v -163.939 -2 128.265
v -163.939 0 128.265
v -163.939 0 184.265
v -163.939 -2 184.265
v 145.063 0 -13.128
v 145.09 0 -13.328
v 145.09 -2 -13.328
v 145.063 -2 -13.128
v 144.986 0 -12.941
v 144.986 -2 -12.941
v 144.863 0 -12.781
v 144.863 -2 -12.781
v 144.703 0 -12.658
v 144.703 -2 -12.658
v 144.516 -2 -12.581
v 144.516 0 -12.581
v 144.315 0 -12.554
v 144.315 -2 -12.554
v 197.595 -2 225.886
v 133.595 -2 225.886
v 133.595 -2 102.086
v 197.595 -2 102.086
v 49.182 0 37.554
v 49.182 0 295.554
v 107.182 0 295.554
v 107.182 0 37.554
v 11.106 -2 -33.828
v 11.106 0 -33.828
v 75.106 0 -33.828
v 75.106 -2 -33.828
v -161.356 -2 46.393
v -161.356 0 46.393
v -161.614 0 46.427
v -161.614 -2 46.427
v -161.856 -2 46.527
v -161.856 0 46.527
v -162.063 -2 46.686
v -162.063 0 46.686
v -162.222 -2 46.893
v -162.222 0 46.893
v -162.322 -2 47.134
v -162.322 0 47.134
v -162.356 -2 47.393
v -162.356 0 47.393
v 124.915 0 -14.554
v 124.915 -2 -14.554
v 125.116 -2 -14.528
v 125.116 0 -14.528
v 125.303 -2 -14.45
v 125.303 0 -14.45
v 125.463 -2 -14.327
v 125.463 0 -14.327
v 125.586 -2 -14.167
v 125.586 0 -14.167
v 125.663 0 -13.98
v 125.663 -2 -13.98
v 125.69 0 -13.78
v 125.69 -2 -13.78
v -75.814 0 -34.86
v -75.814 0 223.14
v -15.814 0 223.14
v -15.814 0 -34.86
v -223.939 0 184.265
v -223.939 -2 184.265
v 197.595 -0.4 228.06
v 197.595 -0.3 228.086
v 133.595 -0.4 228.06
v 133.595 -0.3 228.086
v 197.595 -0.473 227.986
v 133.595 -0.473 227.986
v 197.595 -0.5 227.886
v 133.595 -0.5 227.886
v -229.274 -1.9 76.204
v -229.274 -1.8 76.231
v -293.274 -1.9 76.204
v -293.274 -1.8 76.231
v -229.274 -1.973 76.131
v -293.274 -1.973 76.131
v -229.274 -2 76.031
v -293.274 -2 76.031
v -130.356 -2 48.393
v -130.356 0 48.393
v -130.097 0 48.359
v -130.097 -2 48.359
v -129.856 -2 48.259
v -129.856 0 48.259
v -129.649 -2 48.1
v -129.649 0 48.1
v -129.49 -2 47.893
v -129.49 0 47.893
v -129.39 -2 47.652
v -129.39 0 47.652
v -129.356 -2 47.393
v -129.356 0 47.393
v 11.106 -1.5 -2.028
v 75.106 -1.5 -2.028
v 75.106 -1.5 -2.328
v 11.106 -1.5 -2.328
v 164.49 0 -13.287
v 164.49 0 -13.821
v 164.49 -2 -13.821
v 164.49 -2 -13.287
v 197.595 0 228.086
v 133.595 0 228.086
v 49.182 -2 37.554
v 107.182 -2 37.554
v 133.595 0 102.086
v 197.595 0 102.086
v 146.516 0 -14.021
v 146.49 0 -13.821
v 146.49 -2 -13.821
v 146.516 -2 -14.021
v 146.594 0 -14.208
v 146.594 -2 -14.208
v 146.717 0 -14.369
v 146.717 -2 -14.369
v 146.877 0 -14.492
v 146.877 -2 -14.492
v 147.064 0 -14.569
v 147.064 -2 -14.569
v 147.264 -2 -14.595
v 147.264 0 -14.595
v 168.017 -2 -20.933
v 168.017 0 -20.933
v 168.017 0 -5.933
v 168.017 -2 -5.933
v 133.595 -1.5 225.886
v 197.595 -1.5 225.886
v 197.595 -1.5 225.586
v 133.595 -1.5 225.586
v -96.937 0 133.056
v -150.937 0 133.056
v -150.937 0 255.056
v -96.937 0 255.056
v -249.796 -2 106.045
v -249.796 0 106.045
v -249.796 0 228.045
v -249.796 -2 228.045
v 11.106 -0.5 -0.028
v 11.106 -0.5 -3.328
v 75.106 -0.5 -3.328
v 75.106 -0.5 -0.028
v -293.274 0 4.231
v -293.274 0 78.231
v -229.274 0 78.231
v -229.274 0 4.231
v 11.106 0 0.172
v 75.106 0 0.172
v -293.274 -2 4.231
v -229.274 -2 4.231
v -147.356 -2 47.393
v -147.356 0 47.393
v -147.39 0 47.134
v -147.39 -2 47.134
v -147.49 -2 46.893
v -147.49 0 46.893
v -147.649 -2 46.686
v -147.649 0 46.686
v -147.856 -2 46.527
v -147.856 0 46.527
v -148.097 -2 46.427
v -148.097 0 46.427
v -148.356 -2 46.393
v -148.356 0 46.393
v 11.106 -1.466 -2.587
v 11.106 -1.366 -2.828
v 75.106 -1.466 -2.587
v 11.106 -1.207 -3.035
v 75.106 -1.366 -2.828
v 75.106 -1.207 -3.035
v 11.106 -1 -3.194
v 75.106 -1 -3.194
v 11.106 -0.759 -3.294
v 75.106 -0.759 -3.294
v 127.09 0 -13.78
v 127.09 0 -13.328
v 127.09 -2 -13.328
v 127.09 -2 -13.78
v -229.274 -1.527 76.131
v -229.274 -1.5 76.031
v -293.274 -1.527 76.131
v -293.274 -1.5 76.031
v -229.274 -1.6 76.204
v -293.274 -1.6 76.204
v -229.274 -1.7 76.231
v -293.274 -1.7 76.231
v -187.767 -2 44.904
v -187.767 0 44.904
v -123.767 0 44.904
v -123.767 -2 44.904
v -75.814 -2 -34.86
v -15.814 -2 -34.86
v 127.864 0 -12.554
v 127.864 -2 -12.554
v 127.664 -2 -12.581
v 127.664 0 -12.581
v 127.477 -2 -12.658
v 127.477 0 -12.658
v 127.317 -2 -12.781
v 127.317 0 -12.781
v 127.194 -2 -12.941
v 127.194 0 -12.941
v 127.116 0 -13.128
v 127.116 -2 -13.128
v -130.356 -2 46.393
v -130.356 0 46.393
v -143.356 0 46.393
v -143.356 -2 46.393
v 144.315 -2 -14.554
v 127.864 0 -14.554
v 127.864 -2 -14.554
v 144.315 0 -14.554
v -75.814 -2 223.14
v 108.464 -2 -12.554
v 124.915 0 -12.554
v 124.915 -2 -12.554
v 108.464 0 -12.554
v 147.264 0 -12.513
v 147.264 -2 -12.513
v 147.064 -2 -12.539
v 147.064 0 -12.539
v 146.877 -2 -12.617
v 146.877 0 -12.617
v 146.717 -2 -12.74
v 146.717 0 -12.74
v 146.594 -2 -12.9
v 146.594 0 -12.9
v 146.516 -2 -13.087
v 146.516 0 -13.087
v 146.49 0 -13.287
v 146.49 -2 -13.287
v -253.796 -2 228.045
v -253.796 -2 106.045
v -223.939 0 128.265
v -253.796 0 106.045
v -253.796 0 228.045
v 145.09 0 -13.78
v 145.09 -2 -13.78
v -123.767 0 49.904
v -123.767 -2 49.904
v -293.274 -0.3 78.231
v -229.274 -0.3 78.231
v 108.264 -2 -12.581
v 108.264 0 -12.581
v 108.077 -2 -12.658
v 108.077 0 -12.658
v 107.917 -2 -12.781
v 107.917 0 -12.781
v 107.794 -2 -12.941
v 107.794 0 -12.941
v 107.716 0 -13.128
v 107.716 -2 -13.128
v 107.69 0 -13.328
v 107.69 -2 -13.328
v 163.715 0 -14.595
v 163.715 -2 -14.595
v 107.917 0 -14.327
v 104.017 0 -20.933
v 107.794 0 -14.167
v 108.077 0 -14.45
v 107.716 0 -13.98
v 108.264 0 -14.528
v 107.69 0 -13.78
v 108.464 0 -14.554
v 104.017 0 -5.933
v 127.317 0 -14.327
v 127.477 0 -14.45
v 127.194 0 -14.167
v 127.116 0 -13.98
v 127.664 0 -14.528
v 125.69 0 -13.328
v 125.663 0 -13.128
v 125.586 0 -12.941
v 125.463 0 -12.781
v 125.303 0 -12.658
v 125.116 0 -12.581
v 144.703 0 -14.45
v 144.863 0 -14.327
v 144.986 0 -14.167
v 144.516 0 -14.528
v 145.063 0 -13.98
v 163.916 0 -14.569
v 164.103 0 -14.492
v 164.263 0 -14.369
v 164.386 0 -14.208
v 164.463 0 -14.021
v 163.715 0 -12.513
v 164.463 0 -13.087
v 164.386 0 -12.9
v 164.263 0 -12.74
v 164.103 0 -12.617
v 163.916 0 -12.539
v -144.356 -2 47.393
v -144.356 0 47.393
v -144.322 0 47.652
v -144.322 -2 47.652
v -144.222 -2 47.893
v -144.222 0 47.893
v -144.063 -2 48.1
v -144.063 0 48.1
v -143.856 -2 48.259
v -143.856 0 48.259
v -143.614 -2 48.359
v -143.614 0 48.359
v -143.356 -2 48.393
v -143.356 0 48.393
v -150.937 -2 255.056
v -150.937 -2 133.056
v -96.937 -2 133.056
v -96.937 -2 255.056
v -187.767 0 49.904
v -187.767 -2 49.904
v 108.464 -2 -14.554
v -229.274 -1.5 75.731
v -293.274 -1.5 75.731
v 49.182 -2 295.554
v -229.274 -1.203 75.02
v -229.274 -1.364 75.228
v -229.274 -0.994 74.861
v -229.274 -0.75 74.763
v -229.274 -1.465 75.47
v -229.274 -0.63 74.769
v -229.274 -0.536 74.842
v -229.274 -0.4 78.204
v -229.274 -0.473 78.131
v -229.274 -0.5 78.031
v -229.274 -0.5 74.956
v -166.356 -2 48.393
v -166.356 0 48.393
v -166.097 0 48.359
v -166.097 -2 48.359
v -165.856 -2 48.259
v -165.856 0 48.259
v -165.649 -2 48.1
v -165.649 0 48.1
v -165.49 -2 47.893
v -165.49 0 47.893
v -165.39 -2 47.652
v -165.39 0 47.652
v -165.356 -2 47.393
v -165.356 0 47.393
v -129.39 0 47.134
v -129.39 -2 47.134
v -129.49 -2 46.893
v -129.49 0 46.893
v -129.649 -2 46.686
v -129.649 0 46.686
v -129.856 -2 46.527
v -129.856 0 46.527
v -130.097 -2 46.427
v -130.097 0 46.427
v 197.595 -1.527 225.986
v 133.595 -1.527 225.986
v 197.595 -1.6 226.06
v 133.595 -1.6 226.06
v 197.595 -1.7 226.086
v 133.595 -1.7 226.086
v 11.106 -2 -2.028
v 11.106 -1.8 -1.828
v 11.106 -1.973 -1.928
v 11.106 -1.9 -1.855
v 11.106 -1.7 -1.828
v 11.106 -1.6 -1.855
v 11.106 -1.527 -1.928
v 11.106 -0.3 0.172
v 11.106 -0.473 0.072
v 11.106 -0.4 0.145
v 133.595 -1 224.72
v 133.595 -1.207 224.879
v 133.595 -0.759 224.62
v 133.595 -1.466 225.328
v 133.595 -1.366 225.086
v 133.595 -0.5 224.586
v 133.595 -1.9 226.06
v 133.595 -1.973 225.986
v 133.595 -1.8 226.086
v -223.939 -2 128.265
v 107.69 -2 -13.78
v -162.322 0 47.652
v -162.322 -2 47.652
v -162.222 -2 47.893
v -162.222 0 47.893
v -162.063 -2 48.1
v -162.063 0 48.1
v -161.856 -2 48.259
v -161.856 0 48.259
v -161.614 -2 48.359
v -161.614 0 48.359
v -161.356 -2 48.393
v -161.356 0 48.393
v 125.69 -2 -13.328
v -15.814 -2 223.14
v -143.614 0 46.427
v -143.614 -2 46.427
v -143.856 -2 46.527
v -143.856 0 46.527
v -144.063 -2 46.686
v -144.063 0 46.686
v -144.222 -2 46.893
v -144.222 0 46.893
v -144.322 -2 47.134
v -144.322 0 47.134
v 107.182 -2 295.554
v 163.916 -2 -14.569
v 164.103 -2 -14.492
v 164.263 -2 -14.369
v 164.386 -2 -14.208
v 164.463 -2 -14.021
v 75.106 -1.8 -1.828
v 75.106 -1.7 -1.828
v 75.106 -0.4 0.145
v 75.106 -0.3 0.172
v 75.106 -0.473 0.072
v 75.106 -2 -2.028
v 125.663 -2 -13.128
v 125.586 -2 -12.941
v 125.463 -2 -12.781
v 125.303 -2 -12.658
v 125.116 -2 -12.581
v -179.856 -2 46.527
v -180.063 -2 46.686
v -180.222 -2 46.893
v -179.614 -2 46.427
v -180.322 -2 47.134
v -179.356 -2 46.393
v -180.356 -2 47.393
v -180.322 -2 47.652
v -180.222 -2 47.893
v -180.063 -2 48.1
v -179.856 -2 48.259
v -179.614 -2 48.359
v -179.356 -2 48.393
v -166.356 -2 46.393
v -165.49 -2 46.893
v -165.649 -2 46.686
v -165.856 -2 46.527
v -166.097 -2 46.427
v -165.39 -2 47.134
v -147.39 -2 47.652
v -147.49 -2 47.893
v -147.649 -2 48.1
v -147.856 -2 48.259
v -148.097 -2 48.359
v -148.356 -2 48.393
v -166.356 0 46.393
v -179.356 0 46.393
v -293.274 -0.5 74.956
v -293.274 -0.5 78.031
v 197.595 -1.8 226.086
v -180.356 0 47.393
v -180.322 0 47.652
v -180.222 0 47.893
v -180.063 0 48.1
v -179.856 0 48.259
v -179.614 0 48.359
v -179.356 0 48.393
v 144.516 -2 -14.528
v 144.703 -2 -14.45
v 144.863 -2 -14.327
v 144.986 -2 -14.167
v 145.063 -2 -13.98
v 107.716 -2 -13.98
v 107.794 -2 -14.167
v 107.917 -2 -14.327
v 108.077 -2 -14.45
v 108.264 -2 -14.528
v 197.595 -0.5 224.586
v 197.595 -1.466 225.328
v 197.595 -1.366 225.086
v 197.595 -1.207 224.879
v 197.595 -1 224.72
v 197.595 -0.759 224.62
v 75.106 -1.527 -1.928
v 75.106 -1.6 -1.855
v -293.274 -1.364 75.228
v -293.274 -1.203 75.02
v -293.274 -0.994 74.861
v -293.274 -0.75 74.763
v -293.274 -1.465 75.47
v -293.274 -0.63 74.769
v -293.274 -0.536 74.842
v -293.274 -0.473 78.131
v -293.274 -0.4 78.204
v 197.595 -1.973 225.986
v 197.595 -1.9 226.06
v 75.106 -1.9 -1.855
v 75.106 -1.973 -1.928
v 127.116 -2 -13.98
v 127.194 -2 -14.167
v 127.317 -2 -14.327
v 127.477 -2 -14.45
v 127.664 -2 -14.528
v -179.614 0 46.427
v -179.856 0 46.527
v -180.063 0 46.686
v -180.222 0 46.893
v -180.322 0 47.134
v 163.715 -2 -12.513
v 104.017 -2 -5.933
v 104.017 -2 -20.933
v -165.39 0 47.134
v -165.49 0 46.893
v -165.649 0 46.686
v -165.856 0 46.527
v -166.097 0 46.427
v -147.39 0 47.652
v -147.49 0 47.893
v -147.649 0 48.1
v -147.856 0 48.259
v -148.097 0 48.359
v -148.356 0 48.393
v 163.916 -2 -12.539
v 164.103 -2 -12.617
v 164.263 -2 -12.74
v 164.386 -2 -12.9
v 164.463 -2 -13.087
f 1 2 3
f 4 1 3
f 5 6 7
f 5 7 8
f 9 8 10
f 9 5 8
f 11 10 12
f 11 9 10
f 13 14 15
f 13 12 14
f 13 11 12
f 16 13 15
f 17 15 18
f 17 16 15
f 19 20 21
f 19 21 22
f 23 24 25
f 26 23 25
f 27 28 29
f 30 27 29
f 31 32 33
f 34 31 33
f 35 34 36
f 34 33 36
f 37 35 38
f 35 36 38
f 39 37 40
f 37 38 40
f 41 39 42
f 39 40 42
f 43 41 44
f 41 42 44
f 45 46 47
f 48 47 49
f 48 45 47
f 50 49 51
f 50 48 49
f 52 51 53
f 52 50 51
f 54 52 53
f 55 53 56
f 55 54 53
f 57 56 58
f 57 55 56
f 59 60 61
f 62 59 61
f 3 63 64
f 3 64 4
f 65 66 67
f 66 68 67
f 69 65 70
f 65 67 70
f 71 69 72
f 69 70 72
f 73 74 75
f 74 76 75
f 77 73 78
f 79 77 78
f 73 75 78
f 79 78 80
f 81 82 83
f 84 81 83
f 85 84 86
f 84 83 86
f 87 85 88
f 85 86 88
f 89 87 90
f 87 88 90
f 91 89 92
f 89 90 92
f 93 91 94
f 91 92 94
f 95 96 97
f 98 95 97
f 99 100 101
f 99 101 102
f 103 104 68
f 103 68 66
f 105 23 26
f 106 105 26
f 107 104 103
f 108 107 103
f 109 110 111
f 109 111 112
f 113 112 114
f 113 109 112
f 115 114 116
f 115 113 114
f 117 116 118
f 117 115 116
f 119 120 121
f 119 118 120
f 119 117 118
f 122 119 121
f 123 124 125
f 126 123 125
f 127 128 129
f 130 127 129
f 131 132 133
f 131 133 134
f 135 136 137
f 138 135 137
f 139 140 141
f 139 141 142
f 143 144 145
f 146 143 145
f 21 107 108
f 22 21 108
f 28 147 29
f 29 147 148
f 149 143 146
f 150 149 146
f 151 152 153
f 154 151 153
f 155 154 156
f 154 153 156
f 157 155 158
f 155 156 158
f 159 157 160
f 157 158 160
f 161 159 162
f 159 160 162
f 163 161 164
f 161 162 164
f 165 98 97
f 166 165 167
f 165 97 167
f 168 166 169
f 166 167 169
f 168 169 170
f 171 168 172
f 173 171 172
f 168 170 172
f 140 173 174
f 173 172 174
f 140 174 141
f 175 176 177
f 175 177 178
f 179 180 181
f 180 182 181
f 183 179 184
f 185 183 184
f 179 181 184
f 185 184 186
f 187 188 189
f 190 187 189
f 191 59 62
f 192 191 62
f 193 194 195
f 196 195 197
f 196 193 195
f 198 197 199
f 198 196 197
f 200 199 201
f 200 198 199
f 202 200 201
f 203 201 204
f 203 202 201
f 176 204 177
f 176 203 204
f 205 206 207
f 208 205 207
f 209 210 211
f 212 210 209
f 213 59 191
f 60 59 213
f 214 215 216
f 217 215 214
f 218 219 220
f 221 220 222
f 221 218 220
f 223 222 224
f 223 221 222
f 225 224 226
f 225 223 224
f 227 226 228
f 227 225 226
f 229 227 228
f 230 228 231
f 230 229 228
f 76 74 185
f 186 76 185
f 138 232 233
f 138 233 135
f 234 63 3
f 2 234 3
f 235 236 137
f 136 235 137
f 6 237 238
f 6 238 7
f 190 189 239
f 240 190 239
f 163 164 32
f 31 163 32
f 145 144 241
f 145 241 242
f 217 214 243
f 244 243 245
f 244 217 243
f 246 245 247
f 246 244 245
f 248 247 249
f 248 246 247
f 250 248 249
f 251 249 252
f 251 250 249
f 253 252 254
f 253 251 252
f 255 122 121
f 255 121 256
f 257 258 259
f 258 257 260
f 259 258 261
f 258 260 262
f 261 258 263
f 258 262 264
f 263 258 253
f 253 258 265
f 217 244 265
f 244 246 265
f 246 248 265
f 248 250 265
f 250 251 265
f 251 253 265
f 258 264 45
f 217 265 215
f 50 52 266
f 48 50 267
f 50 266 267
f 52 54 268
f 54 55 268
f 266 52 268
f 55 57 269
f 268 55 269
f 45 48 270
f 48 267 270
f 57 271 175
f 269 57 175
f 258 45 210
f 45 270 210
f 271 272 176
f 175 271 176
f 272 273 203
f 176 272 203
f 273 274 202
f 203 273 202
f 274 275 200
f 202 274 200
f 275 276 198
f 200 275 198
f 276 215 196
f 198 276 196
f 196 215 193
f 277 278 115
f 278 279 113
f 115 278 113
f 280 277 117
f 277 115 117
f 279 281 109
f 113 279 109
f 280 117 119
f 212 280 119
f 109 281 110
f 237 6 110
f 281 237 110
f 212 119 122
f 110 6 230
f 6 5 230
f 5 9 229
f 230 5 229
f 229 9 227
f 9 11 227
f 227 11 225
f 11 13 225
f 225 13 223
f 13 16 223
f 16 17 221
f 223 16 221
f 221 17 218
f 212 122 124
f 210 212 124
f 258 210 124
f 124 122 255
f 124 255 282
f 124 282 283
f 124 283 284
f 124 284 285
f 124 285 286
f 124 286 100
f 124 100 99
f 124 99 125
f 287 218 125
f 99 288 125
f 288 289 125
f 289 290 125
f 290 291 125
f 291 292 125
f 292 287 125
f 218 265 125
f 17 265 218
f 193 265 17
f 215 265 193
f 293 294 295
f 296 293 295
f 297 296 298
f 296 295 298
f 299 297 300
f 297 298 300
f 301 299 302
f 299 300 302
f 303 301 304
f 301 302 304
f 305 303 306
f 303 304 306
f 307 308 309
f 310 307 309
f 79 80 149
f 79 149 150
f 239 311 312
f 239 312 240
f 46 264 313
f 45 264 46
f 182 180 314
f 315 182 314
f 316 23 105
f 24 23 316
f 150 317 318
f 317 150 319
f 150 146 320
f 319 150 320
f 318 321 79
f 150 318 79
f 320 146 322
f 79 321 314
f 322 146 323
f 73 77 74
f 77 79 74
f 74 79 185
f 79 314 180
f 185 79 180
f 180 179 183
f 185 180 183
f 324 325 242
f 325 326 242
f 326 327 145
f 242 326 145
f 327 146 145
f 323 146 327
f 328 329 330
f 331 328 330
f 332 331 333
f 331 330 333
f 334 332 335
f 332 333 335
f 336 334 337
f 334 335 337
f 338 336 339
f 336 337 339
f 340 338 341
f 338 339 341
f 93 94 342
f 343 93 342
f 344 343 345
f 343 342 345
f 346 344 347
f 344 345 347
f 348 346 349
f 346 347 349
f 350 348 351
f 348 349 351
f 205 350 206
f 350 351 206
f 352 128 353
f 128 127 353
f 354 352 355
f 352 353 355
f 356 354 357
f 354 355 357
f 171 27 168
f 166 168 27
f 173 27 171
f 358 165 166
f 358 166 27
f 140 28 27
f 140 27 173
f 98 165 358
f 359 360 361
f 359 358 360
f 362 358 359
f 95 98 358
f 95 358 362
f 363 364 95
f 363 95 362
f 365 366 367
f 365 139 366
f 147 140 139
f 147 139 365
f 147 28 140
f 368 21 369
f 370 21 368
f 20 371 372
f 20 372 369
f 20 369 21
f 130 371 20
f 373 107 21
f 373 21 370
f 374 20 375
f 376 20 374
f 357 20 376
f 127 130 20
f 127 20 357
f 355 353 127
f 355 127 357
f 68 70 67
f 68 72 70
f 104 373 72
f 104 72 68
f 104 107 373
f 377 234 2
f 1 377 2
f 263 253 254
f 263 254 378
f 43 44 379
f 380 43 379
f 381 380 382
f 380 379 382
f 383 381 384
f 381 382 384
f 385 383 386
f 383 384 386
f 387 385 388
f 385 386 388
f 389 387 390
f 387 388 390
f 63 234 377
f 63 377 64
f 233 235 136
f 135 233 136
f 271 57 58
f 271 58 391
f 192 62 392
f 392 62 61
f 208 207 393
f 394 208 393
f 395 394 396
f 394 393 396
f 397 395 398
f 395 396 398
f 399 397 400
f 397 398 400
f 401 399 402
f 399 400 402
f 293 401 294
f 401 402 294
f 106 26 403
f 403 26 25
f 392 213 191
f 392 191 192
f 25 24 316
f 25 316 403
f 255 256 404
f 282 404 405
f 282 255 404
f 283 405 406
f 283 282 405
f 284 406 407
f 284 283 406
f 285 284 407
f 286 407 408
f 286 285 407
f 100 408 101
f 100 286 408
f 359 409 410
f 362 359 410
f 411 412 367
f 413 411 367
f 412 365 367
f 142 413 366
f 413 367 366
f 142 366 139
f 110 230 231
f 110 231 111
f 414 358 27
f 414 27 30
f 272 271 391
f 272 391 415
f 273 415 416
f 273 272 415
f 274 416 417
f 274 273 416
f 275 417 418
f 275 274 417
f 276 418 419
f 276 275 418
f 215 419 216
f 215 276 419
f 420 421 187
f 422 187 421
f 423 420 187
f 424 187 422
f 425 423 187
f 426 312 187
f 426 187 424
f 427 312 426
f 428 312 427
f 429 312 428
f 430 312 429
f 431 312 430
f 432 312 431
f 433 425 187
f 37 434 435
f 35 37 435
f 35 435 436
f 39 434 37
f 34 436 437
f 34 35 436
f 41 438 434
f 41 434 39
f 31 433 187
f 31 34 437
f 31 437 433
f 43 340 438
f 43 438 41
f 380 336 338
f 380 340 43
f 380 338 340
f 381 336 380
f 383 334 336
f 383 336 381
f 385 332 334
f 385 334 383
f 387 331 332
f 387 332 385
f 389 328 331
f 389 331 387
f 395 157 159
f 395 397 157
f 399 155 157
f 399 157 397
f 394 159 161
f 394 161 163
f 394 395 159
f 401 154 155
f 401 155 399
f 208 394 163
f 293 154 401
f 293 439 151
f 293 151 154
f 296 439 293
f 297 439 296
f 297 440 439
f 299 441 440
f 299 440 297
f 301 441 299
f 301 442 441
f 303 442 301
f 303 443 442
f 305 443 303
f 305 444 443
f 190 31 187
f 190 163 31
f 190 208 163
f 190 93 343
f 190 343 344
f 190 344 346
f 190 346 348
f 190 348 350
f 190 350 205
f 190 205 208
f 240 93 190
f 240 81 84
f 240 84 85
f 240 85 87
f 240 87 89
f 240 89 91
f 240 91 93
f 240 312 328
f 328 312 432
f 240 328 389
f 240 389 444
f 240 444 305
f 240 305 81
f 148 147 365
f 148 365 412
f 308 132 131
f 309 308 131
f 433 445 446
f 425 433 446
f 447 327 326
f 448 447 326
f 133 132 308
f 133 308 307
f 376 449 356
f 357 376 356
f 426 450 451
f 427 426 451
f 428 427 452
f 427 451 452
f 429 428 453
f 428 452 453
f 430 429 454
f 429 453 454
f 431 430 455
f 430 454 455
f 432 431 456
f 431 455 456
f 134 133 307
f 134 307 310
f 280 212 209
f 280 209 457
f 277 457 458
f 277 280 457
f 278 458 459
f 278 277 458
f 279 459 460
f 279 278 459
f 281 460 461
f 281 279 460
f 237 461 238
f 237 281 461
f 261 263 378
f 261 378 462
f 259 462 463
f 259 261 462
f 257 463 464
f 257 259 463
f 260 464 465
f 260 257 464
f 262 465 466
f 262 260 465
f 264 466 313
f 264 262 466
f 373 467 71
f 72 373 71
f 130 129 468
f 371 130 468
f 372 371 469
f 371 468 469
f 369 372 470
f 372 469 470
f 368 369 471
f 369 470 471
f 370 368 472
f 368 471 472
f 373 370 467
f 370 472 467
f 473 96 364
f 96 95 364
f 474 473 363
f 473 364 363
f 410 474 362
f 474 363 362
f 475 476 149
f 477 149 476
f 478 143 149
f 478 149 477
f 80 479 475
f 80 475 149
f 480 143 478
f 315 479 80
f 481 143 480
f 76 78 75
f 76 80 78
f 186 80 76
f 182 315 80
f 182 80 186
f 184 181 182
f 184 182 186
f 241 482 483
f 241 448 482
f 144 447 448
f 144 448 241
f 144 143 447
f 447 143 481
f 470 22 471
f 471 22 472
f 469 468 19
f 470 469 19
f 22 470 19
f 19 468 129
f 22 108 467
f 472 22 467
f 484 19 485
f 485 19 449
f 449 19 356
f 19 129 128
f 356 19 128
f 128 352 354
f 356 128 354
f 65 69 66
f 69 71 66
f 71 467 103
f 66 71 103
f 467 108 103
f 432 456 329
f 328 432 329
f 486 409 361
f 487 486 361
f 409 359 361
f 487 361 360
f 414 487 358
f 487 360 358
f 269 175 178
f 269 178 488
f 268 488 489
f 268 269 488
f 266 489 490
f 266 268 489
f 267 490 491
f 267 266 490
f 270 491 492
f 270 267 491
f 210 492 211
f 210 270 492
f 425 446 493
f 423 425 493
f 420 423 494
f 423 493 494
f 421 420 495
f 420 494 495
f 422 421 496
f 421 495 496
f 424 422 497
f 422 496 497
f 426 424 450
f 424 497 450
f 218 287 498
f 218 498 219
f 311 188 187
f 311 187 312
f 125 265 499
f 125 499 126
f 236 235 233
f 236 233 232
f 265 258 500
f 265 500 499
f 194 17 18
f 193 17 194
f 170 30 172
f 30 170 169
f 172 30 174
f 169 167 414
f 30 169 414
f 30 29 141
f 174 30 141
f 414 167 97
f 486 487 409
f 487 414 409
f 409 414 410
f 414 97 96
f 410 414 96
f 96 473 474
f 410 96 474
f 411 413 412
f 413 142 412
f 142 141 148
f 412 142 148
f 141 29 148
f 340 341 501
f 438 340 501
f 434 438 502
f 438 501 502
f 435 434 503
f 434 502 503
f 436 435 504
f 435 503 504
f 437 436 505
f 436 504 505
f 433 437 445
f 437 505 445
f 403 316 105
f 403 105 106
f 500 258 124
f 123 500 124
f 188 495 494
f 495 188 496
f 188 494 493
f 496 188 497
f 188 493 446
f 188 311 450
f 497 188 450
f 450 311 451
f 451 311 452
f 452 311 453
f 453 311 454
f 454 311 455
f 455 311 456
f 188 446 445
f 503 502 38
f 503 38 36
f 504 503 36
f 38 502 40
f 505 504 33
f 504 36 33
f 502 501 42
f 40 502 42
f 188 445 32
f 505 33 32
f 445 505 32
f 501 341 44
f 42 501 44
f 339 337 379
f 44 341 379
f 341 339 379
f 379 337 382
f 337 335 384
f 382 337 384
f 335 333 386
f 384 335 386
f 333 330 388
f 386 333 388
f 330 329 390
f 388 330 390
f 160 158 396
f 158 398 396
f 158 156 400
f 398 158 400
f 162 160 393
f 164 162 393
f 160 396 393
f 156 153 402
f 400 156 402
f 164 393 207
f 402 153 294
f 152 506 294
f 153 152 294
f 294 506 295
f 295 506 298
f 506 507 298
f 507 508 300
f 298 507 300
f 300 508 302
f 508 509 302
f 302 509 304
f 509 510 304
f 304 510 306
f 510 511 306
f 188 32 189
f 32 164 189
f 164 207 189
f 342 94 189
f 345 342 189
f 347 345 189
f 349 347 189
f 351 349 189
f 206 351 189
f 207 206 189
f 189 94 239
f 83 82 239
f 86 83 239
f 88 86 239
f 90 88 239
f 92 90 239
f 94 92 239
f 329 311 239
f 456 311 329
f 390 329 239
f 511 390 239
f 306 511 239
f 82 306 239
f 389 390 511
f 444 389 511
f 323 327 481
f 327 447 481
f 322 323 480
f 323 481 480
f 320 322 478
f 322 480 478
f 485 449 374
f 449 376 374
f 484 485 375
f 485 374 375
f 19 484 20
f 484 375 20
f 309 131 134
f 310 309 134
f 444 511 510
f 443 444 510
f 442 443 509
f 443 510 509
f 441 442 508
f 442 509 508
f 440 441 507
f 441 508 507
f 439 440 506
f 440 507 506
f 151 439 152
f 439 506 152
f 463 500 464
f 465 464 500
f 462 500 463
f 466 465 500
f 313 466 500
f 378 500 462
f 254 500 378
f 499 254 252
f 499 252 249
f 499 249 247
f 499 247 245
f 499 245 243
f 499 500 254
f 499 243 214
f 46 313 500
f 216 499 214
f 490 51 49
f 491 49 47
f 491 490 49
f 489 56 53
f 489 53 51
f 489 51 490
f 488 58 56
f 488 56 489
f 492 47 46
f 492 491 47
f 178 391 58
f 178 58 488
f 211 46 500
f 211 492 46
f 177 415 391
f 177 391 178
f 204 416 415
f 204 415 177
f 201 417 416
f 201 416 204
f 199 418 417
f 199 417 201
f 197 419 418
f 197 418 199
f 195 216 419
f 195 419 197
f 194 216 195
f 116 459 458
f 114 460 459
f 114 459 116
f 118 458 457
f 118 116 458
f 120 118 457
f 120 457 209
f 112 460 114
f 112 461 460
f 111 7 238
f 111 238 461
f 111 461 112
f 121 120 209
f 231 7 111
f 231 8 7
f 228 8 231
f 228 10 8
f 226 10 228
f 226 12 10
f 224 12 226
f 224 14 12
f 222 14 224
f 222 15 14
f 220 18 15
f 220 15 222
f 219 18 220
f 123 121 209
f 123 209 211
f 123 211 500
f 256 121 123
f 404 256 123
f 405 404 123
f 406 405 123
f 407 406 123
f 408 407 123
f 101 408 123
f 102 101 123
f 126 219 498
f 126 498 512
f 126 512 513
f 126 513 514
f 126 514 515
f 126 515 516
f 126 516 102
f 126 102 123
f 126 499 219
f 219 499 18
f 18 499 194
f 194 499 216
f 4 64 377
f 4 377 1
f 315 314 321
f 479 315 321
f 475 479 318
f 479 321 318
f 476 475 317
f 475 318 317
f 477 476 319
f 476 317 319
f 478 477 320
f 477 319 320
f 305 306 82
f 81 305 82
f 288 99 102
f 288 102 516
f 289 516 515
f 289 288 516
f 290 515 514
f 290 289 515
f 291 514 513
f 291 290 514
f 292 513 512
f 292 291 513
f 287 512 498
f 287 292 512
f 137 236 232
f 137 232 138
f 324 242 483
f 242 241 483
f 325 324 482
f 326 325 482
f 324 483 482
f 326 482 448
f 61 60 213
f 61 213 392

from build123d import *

# Parameters (mm, degrees)
F0_W      = 60
F0_H      = 258
F1_DEPTH  = 2
F2_W      = 58
F2_H      = 258
F3_DEPTH  = 2
F4_W      = 60
F4_H      = 56
F5_DEPTH  = 2
F6_W      = 64
F6_H      = 5
F7_DEPTH  = 2
F8_W      = 64
F8_H      = 74
F9_DEPTH  = 2
F10_W     = 64
F10_H     = 15
F11_DEPTH = 2
F13_DEPTH = 4
F14_W     = 64
F14_H     = 126
F15_DEPTH = 2
F16_W     = 64
F16_H     = 34
F17_DEPTH = 2
F18_W     = 54
F18_H     = 122
F19_DEPTH = 2
F20_W     = 4
F20_H     = 122
F21_DEPTH = 2
F23_DEPTH = 64
F24_R     = 0.2
F26_DEPTH = 64
F27_R     = 0.2
F29_DEPTH = 64
F30_R     = 0.2


with BuildPart() as f1:
    # F0 (on Front) → F1 (new body)
    with BuildSketch(Plane.XZ):
        with Locations((-45.8140162975, 94.1403650641)):
            Rectangle(F0_W, F0_H)
    extrude(amount=F1_DEPTH)


with BuildPart() as f3:
    # F2 (on Front) → F3 (new body)
    with BuildSketch(Plane.XZ):
        with Locations((78.1819216013, 166.5537835062)):
            Rectangle(F2_W, F2_H)
    extrude(amount=F3_DEPTH)


with BuildPart() as f5:
    # F4 (on Front) → F5 (new body)
    with BuildSketch(Plane.XZ):
        with Locations((-193.9391981363, 156.2652424913)):
            Rectangle(F4_W, F4_H)
    extrude(amount=F5_DEPTH)


with BuildPart() as f7:
    # F6 (on Front) → F7 (new body)
    with BuildSketch(Plane.XZ):
        with Locations((-155.7672946453, 47.4037402868)):
            Rectangle(F6_W, F6_H)
        with BuildLine():
            ThreePointArc((-180.3556742668, 47.3932959139), (-180.062781048, 48.1004026951), (-179.3556742668, 48.3932959139))
            Line((-179.3556742668, 48.3932959139), (-166.3556742668, 48.3932959139))
            ThreePointArc((-166.3556742668, 48.3932959139), (-165.6485674856, 48.1004026951), (-165.3556742668, 47.3932959139))
            ThreePointArc((-165.3556742668, 47.3932959139), (-165.6485674856, 46.6861891327), (-166.3556742668, 46.3932959139))
            Line((-166.3556742668, 46.3932959139), (-179.3556742668, 46.3932959139))
            ThreePointArc((-179.3556742668, 46.3932959139), (-180.062781048, 46.6861891327), (-180.3556742668, 47.3932959139))
        make_face(mode=Mode.SUBTRACT)
        with BuildLine():
            ThreePointArc((-162.3556742668, 47.3932959139), (-162.062781048, 48.1004026951), (-161.3556742668, 48.3932959139))
            Line((-161.3556742668, 48.3932959139), (-148.3556742668, 48.3932959139))
            ThreePointArc((-148.3556742668, 48.3932959139), (-147.6485674856, 48.1004026951), (-147.3556742668, 47.3932959139))
            ThreePointArc((-147.3556742668, 47.3932959139), (-147.6485674856, 46.6861891327), (-148.3556742668, 46.3932959139))
            Line((-148.3556742668, 46.3932959139), (-161.3556742668, 46.3932959139))
            ThreePointArc((-161.3556742668, 46.3932959139), (-162.062781048, 46.6861891327), (-162.3556742668, 47.3932959139))
        make_face(mode=Mode.SUBTRACT)
        with BuildLine():
            ThreePointArc((-144.3556742668, 47.3932959139), (-144.062781048, 48.1004026951), (-143.3556742668, 48.3932959139))
            Line((-143.3556742668, 48.3932959139), (-130.3556742668, 48.3932959139))
            ThreePointArc((-130.3556742668, 48.3932959139), (-129.6485674856, 48.1004026951), (-129.3556742668, 47.3932959139))
            ThreePointArc((-129.3556742668, 47.3932959139), (-129.6485674856, 46.6861891327), (-130.3556742668, 46.3932959139))
            Line((-130.3556742668, 46.3932959139), (-143.3556742668, 46.3932959139))
            ThreePointArc((-143.3556742668, 46.3932959139), (-144.062781048, 46.6861891327), (-144.3556742668, 47.3932959139))
        make_face(mode=Mode.SUBTRACT)
    extrude(amount=F7_DEPTH)


with BuildPart() as f9:
    # F8 (on Front) → F9 (new body)
    with BuildSketch(Plane.XZ):
        with Locations((-261.2743257284, 41.2309435084)):
            Rectangle(F8_W, F8_H)
    extrude(amount=F9_DEPTH)

    # F22 (on face) → F23 (cut)
    with BuildSketch(Plane.YZ.offset(-229.2743257284)):
        with BuildLine():
            Line((-0.5, 78.2309435084), (-2, 78.2309435084))
            Line((-2, 78.2309435084), (-2, 76.2309435084))
            Line((-2, 76.2309435084), (-1.5, 76.2309435084))
            Line((-1.5, 76.2309435084), (-1.5, 75.7309435084))
            ThreePointArc((-1.5, 75.7309435084), (-1.2071067812, 75.0238367273), (-0.5, 74.7309435084))
            Line((-0.5, 74.7309435084), (-0.5, 78.2309435084))
        make_face()
    extrude(amount=-F23_DEPTH, mode=Mode.SUBTRACT)

    # F24
    f24_edges = [f9.edges().sort_by_distance(p)[0] for p in [
        (-261.274326, -0.5, 78.230944),
        (-261.274326, -2, 76.230944),
        (-261.274326, -0.5, 74.730944),
        (-261.274326, -1.5, 76.230944),
    ]]
    fillet(f24_edges, radius=F24_R)


with BuildPart() as f11:
    # F10 (on Front) → F11 (new body)
    with BuildSketch(Plane.XZ):
        with Locations((136.0173345804, -13.4328569472)):
            Rectangle(F10_W, F10_H)
    extrude(amount=F11_DEPTH)

    # F12 (on Front) → F13 (cut)
    with BuildSketch(Plane.XZ):
        with BuildLine():
            Line((124.9154765659, -12.5541486777), (108.4641042895, -12.5541486777))
            ThreePointArc((108.4641042895, -12.5541486777), (107.916581707, -12.7809399571), (107.6897904277, -13.3284625395))
            Line((107.6897904277, -13.3284625395), (107.6897904277, -13.7798348159))
            ThreePointArc((107.6897904277, -13.7798348159), (107.916581707, -14.3273573984), (108.4641042895, -14.5541486777))
            Line((108.4641042895, -14.5541486777), (124.9154765659, -14.5541486777))
            ThreePointArc((124.9154765659, -14.5541486777), (125.4629991483, -14.3273573984), (125.6897904277, -13.7798348159))
            Line((125.6897904277, -13.7798348159), (125.6897904277, -13.3284625395))
            ThreePointArc((125.6897904277, -13.3284625395), (125.4629991483, -12.7809399571), (124.9154765659, -12.5541486777))
        make_face()
        with BuildLine():
            Line((144.3154765659, -12.5541477464), (127.8641042895, -12.5541477464))
            ThreePointArc((127.8641042895, -12.5541477464), (127.316581707, -12.7809390258), (127.0897904277, -13.3284616082))
            Line((127.0897904277, -13.3284616082), (127.0897904277, -13.7798348159))
            ThreePointArc((127.0897904277, -13.7798348159), (127.316581707, -14.3273573984), (127.8641042895, -14.5541486777))
            Line((127.8641042895, -14.5541486777), (144.3154765659, -14.5541486777))
            ThreePointArc((144.3154765659, -14.5541486777), (144.8629991483, -14.3273573984), (145.0897904277, -13.7798348159))
            Line((145.0897904277, -13.7798348159), (145.0897904277, -13.3284616082))
            ThreePointArc((145.0897904277, -13.3284616082), (144.8629991483, -12.7809390258), (144.3154765659, -12.5541477464))
        make_face()
        with BuildLine():
            Line((163.7154765659, -12.5129134394), (147.2641042895, -12.5129134394))
            ThreePointArc((147.2641042895, -12.5129134394), (146.716581707, -12.7397047188), (146.4897904277, -13.2872273012))
            Line((146.4897904277, -13.2872273012), (146.4897904277, -13.8210691229))
            ThreePointArc((146.4897904277, -13.8210691229), (146.716581707, -14.3685917054), (147.2641042895, -14.5953829847))
            Line((147.2641042895, -14.5953829847), (163.7154765659, -14.5953829847))
            ThreePointArc((163.7154765659, -14.5953829847), (164.2629991483, -14.3685917054), (164.4897904277, -13.8210691229))
            Line((164.4897904277, -13.8210691229), (164.4897904277, -13.2872273012))
            ThreePointArc((164.4897904277, -13.2872273012), (164.2629991483, -12.7397047188), (163.7154765659, -12.5129134394))
        make_face()
    extrude(amount=F13_DEPTH, mode=Mode.SUBTRACT)


with BuildPart() as f15:
    # F14 (on Front) → F15 (new body)
    with BuildSketch(Plane.XZ):
        with Locations((165.5951834917, 165.0863875747)):
            Rectangle(F14_W, F14_H)
    extrude(amount=F15_DEPTH)

    # F25 (on face) → F26 (cut)
    with BuildSketch(Plane.YZ.offset(197.5951834917)):
        with BuildLine():
            Line((-0.5, 228.0863875747), (-2, 228.0863875747))
            Line((-2, 228.0863875747), (-2, 226.0863875747))
            Line((-2, 226.0863875747), (-1.5, 226.0863875747))
            Line((-1.5, 226.0863875747), (-1.5, 225.5863875747))
            ThreePointArc((-1.5, 225.5863875747), (-1.2071067812, 224.8792807935), (-0.5, 224.5863875747))
            Line((-0.5, 224.5863875747), (-0.5, 228.0863875747))
        make_face()
    extrude(amount=-F26_DEPTH, mode=Mode.SUBTRACT)

    # F27
    f27_edges = [f15.edges().sort_by_distance(p)[0] for p in [
        (165.595183, -0.5, 228.086388),
        (165.595183, -2, 226.086388),
        (165.595183, -1.5, 226.086388),
    ]]
    fillet(f27_edges, radius=F27_R)


with BuildPart() as f17:
    # F16 (on Front) → F17 (new body)
    with BuildSketch(Plane.XZ):
        with Locations((43.1058065668, -16.8282787427)):
            Rectangle(F16_W, F16_H)
    extrude(amount=F17_DEPTH)

    # F28 (on face) → F29 (cut)
    with BuildSketch(Plane.YZ.offset(75.1058065668)):
        with BuildLine():
            Line((-0.5, 0.1717212573), (-2, 0.1717212573))
            Line((-2, 0.1717212573), (-2, -1.8282787427))
            Line((-2, -1.8282787427), (-1.5, -1.8282787427))
            Line((-1.5, -1.8282787427), (-1.5, -2.3282787427))
            ThreePointArc((-1.5, -2.3282787427), (-1.2071067812, -3.0353855239), (-0.5, -3.3282787427))
            Line((-0.5, -3.3282787427), (-0.5, 0.1717212573))
        make_face()
    extrude(amount=-F29_DEPTH, mode=Mode.SUBTRACT)

    # F30
    f30_edges = [f17.edges().sort_by_distance(p)[0] for p in [
        (43.105807, -0.5, 0.171721),
        (43.105807, -1.5, -1.828279),
        (43.105807, -2, -1.828279),
    ]]
    fillet(f30_edges, radius=F30_R)


with BuildPart() as f19:
    # F18 (on Front) → F19 (new body)
    with BuildSketch(Plane.XZ):
        with Locations((-123.9371697903, 194.0556869507)):
            Rectangle(F18_W, F18_H)
    extrude(amount=F19_DEPTH)


with BuildPart() as f21:
    # F20 (on Front) → F21 (new body)
    with BuildSketch(Plane.XZ):
        with Locations((-251.7955411673, 167.0450652838)):
            Rectangle(F20_W, F20_H)
    extrude(amount=F21_DEPTH)


solid = Compound([f1.part, f3.part, f5.part, f7.part, f9.part, f11.part, f15.part, f17.part, f19.part, f21.part])
